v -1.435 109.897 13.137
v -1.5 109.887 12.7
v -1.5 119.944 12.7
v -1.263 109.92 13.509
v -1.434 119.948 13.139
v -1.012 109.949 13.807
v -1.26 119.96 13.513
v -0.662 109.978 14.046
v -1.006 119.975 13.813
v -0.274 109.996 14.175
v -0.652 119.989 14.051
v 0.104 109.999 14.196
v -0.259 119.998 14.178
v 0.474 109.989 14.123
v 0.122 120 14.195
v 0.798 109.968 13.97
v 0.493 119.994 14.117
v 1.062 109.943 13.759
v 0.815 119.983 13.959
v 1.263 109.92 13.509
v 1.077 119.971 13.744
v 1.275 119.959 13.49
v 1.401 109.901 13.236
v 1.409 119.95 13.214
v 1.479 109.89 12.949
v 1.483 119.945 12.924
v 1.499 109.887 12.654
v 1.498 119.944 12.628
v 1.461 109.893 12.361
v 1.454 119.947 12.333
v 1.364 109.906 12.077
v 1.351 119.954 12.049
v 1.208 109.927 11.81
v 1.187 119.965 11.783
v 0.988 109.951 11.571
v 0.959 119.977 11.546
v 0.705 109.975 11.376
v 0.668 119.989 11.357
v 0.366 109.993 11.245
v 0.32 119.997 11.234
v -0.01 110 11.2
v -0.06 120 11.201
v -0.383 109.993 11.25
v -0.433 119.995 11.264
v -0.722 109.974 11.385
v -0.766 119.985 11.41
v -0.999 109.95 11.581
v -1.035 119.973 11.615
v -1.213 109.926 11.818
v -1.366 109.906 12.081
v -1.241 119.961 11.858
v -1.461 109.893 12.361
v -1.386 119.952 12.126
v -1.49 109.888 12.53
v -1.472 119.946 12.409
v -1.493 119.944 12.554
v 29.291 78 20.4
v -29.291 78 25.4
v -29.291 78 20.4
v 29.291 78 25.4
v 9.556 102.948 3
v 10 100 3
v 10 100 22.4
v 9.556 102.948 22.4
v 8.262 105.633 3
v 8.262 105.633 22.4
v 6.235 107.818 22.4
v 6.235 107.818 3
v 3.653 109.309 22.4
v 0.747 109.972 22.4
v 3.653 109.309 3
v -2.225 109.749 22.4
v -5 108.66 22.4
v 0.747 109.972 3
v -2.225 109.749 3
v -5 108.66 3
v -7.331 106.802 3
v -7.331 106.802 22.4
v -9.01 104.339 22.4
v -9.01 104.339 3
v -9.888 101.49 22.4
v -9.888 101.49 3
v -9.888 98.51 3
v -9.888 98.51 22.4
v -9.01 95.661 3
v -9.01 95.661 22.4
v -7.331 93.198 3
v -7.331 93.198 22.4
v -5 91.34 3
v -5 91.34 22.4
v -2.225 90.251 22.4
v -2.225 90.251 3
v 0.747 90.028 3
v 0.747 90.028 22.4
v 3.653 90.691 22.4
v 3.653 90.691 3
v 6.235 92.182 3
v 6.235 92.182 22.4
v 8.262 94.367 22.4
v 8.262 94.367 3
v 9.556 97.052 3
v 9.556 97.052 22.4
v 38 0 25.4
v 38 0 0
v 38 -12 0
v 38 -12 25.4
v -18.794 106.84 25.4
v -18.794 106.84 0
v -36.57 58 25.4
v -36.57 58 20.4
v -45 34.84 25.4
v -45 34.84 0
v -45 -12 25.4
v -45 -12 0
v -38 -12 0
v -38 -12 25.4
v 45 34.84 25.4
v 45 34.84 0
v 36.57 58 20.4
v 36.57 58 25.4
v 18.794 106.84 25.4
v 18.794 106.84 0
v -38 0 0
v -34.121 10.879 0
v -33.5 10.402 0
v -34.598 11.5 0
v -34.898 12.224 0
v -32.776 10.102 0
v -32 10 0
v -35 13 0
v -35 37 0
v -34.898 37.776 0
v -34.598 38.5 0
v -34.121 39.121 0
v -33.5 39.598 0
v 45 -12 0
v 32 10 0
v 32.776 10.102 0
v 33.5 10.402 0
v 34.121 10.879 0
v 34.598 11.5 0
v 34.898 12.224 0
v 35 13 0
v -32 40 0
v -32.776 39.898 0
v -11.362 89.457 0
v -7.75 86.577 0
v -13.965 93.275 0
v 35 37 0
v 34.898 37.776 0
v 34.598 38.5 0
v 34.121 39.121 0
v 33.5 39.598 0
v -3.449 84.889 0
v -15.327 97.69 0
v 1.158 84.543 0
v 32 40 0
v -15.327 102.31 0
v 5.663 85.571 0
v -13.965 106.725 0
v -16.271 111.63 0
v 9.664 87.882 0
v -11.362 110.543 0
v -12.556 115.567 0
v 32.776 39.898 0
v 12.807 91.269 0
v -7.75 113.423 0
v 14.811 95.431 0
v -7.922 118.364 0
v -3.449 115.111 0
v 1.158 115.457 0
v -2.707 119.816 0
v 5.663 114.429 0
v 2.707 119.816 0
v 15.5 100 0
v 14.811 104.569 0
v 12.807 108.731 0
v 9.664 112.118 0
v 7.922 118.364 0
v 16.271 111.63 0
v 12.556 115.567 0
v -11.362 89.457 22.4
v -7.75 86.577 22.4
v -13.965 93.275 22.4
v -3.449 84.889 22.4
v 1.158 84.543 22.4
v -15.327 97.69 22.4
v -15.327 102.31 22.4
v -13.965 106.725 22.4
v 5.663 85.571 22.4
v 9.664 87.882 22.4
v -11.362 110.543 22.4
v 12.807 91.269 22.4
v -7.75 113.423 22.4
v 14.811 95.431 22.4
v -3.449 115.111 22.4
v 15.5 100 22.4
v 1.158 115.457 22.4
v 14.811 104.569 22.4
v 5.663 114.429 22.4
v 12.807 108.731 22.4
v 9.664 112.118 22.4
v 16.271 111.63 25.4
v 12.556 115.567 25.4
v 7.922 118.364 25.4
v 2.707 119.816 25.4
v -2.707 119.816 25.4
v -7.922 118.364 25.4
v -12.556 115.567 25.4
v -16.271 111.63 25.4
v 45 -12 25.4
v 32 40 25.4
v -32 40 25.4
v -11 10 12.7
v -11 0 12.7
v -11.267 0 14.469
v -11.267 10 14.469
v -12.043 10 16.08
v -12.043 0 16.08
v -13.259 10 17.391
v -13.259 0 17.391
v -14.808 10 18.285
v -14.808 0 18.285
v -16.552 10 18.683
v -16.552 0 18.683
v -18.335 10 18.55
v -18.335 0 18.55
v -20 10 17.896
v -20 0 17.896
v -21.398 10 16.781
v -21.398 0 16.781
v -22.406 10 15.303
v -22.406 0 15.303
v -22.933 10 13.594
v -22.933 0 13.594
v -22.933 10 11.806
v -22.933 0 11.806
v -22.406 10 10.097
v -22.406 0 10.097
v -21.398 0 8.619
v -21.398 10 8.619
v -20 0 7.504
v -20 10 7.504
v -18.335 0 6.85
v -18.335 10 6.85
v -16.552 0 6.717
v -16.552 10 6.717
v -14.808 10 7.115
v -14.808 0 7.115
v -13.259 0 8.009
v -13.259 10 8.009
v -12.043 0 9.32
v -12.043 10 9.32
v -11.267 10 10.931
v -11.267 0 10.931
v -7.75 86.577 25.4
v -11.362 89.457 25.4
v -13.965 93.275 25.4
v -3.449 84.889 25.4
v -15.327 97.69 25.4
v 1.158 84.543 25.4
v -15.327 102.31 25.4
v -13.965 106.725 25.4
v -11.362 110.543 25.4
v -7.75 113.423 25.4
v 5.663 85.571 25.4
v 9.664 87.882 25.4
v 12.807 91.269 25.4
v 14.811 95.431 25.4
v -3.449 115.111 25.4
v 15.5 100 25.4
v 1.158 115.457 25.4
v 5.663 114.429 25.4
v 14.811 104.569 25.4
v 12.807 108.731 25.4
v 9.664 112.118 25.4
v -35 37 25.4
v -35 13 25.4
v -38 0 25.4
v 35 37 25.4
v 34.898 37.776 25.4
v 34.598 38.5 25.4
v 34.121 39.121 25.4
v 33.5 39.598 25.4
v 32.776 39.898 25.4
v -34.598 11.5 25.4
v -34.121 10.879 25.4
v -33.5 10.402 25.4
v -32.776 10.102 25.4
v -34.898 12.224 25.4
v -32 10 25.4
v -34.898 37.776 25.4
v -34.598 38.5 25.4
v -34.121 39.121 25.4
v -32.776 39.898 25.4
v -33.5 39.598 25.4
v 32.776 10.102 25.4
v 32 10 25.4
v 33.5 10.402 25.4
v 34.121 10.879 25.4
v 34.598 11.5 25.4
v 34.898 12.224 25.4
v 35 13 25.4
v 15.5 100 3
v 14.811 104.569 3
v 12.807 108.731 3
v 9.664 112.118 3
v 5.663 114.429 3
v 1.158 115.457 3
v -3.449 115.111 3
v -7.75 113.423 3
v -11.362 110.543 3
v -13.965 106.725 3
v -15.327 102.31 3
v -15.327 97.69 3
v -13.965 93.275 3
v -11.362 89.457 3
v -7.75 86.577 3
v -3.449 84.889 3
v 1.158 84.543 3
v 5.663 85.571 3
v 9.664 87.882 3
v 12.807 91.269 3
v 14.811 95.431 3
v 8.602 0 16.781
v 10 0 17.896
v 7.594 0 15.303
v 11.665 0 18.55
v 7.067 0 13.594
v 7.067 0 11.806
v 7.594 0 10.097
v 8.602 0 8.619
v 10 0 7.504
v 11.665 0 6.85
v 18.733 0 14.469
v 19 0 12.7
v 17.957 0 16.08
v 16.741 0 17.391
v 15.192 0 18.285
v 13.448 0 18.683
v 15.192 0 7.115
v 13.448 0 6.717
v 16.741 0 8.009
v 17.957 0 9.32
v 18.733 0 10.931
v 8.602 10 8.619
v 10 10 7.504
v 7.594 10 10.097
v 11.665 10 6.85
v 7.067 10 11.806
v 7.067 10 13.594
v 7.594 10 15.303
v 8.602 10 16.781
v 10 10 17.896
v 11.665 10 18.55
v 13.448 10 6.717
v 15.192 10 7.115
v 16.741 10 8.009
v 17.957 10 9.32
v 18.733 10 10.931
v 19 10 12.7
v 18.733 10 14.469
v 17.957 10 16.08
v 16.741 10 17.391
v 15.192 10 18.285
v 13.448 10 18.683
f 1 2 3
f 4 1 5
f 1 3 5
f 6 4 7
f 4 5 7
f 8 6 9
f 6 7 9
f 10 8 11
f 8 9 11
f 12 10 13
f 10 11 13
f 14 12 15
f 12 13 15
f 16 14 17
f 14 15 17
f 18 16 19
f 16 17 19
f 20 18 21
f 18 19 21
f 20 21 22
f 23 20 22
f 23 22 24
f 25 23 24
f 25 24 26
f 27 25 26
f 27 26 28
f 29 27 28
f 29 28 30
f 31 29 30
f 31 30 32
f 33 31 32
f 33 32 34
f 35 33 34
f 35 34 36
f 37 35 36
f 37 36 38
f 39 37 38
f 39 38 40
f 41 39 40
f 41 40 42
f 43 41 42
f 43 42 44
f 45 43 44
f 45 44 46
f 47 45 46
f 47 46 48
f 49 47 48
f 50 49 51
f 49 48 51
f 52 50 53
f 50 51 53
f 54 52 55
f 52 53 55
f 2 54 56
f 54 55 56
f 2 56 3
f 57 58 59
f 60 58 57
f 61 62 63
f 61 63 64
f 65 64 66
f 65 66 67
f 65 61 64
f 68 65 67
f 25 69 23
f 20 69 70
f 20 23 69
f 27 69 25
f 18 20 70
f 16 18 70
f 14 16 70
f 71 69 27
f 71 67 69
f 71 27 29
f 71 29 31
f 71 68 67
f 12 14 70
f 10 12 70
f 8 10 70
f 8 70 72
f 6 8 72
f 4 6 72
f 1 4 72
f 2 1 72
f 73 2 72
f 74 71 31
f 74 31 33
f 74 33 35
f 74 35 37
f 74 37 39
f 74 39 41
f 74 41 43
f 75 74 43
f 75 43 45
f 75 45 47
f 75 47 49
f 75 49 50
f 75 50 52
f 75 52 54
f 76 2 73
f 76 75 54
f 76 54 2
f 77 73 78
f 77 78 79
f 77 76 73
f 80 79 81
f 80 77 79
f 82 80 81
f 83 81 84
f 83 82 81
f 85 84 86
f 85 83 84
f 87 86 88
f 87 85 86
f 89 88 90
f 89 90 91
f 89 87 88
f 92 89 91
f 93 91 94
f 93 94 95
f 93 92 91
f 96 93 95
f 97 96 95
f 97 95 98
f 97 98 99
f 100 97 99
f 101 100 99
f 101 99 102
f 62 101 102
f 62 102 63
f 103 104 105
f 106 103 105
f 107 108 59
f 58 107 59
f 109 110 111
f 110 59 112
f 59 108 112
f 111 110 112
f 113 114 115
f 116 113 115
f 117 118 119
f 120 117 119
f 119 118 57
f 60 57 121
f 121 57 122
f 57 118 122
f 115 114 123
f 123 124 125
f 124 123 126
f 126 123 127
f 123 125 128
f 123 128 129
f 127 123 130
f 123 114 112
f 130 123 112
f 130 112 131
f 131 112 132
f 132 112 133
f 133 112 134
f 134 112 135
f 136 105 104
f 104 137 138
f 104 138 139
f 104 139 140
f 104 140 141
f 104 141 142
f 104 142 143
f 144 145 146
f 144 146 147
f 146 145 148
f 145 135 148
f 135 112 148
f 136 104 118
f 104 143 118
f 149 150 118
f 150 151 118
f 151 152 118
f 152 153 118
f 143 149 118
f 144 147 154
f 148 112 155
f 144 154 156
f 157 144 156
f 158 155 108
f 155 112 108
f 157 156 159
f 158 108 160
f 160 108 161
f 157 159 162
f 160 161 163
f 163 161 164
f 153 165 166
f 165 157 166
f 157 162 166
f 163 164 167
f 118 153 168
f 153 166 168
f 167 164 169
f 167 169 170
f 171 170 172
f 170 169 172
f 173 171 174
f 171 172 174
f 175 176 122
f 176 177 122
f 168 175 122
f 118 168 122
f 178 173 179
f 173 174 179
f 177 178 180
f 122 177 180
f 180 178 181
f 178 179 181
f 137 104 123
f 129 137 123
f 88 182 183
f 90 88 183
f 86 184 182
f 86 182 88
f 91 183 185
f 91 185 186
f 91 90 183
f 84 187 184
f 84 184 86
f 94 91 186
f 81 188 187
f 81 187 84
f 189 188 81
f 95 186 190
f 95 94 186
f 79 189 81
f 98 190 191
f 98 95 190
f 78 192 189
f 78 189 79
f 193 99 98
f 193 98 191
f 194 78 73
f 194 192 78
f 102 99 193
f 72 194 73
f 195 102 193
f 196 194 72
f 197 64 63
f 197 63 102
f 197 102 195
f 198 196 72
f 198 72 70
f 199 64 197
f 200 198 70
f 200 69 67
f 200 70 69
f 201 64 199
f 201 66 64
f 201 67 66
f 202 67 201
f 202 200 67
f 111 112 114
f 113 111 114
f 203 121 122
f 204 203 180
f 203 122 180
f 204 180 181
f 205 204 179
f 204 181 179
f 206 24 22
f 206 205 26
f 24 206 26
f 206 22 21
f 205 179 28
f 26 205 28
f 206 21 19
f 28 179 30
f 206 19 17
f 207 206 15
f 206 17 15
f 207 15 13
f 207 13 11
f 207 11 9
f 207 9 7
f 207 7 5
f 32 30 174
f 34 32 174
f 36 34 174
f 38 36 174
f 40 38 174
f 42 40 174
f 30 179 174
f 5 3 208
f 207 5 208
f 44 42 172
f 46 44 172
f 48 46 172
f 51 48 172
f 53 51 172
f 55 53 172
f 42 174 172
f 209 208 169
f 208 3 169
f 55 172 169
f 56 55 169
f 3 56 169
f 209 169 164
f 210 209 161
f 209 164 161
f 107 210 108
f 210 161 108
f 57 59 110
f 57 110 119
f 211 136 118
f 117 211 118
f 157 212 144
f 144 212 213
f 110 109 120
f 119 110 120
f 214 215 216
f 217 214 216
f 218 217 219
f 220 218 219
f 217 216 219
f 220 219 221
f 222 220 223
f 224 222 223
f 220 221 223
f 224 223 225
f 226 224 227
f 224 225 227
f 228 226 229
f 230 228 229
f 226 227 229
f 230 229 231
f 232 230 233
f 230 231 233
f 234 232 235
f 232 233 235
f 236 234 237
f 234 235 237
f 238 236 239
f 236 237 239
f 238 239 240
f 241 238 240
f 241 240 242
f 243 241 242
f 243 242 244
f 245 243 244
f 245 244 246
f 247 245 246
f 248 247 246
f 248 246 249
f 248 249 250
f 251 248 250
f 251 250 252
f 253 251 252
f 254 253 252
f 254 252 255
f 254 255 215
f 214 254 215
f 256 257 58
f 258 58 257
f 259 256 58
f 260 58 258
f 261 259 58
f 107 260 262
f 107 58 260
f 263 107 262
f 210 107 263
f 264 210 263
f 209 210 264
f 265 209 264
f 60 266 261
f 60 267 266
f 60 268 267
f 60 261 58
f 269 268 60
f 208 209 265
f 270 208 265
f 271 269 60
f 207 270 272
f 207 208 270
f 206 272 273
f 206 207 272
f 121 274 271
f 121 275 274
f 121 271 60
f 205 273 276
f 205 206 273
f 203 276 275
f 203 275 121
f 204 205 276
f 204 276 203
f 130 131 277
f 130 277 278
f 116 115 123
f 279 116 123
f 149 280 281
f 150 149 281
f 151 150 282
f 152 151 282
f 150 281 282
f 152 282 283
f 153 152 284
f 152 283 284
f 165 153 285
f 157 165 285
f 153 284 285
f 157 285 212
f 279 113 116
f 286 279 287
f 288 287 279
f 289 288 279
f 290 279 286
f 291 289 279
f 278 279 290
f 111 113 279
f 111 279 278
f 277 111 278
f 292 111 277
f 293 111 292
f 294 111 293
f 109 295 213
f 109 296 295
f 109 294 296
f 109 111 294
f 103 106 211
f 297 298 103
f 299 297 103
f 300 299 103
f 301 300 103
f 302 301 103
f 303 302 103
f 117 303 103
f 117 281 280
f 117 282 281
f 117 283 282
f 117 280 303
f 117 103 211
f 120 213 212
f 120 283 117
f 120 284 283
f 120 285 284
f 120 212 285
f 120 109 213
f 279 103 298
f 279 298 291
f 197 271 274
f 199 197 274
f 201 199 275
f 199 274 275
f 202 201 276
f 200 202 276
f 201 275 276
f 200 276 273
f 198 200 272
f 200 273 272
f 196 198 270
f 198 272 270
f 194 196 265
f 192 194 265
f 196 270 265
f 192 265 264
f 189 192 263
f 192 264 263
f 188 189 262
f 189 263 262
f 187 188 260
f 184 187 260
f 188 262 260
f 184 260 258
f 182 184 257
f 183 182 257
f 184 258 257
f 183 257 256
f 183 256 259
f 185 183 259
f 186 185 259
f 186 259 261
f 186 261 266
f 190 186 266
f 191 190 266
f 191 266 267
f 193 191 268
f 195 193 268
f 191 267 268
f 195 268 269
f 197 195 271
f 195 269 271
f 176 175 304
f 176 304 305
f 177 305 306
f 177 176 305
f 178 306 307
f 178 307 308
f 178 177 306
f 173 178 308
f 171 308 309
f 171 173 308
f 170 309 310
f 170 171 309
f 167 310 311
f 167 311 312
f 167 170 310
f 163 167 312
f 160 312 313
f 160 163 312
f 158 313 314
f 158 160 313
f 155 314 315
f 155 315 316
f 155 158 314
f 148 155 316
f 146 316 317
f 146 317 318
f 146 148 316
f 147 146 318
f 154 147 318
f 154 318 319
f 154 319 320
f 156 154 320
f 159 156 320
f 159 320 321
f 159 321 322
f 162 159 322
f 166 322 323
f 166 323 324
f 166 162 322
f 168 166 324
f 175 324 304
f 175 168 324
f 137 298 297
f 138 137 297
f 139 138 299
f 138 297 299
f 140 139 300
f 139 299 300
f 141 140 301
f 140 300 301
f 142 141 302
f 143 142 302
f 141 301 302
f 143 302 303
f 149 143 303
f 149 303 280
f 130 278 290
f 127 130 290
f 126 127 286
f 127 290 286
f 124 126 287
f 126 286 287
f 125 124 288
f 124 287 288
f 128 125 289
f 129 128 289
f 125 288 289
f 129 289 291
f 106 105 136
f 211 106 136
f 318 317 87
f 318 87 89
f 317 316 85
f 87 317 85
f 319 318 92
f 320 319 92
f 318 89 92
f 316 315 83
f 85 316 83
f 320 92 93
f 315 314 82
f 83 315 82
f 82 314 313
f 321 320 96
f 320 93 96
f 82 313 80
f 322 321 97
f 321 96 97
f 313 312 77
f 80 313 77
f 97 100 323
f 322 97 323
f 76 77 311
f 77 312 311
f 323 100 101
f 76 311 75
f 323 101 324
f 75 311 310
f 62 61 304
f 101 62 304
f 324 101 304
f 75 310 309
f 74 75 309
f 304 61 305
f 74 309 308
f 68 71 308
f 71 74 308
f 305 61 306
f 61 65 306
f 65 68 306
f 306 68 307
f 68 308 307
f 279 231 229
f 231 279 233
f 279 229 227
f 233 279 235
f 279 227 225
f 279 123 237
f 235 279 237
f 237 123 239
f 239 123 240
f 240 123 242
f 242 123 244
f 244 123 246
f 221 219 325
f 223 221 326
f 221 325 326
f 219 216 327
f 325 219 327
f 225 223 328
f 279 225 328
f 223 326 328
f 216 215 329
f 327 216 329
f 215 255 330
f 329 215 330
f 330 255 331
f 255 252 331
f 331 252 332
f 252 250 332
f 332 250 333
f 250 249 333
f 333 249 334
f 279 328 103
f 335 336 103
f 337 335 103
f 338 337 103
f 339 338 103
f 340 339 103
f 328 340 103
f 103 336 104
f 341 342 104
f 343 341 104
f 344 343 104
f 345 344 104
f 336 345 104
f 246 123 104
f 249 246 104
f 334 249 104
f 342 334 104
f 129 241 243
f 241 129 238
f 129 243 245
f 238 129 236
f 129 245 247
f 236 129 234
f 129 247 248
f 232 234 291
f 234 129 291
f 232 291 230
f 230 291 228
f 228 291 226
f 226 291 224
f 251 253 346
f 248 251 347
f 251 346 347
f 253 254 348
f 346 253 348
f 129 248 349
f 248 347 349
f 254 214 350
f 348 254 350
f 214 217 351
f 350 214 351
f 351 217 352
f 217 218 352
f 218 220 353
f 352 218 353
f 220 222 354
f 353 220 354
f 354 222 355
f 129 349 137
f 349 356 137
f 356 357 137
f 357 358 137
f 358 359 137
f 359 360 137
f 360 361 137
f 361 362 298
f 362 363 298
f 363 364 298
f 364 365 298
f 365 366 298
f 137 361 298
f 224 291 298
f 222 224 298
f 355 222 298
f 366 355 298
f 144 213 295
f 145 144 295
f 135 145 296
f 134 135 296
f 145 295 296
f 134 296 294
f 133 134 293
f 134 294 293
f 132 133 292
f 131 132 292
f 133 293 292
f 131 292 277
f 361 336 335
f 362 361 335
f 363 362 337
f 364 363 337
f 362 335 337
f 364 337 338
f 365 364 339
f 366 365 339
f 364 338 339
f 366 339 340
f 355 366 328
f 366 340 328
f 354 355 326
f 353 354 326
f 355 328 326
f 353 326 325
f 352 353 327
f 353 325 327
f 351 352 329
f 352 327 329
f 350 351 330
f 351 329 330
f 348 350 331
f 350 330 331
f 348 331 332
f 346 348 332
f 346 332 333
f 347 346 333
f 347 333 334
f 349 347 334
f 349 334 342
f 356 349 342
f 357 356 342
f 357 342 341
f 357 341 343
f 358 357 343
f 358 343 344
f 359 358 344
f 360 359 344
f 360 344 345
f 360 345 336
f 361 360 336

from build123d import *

# Parameters (mm, degrees)
SKETCH1_R          = 10
EXTRUDE1_DEPTH     = 25.4
CUT_EXTRUDE1_DEPTH = 26.4
CUT_EXTRUDE2_REACH = 122
SKETCH5_R          = 6
CUT_EXTRUDE3_REACH = 151
SKETCH6_R          = 1.5
SKETCH7_W          = 131.09029237
SKETCH7_H          = 20
EXTRUDE2_DEPTH     = 5
SKETCH8_R          = 15.5
SKETCH8_R_2        = 10
EXTRUDE3_DEPTH     = 3


with BuildPart() as part:
    # Sketch1 → Extrude1 (new body)
    with BuildSketch(Plane.XY):
        with BuildLine():
            Line((-38, 0), (38, 0))
            Line((38, 0), (38, -12))
            Line((38, -12), (45, -12))
            Line((45, -12), (45, 34.839604128))
            Line((45, 34.839604128), (18.793852416, 106.840402867))
            ThreePointArc((18.793852416, 106.840402867), (0, 120), (-18.793852416, 106.840402867))
            Line((-18.793852416, 106.840402867), (-45, 34.839604128))
            Line((-45, 34.839604128), (-45, -12))
            Line((-45, -12), (-38, -12))
            Line((-38, -12), (-38, 0))
        make_face()
        with Locations((0, 100)):
            Circle(SKETCH1_R, mode=Mode.SUBTRACT)
    extrude(amount=EXTRUDE1_DEPTH)

    # Sketch2 → Cut-Extrude1 (cut, through all)
    with BuildSketch(Plane.XY.offset(25.4)):
        with BuildLine():
            Line((-32, 10), (32, 10))
            ThreePointArc((32, 10), (34.121320344, 10.878679656), (35, 13))
            Line((35, 13), (35, 37))
            ThreePointArc((35, 37), (34.121320344, 39.121320344), (32, 40))
            Line((32, 40), (-32, 40))
            ThreePointArc((-32, 40), (-34.121320344, 39.121320344), (-35, 37))
            Line((-35, 37), (-35, 13))
            ThreePointArc((-35, 13), (-34.121320344, 10.878679656), (-32, 10))
        make_face()
    extrude(amount=-CUT_EXTRUDE1_DEPTH, mode=Mode.SUBTRACT)

    # Sketch5 → Cut-Extrude2 (cut, up to next)
    with BuildSketch(Plane.XZ, mode=Mode.PRIVATE) as cut_extrude2_sk1:
        with Locations((13, 12.7)):
            Circle(SKETCH5_R)
    cut_extrude2_tool1 = extrude(cut_extrude2_sk1.sketch, amount=-CUT_EXTRUDE2_REACH, mode=Mode.PRIVATE) & part.part
    add(cut_extrude2_tool1.solids().sort_by_distance((13, 0, 12.7))[0], mode=Mode.SUBTRACT)
    # Sketch5 → Cut-Extrude2 (cut, up to next)
    with BuildSketch(Plane.XZ, mode=Mode.PRIVATE) as cut_extrude2_sk2:
        with Locations((-17, 12.7)):
            Circle(SKETCH5_R)
    cut_extrude2_tool2 = extrude(cut_extrude2_sk2.sketch, amount=-CUT_EXTRUDE2_REACH, mode=Mode.PRIVATE) & part.part
    add(cut_extrude2_tool2.solids().sort_by_distance((-17, 0, 12.7))[0], mode=Mode.SUBTRACT)

    # Sketch6 → Cut-Extrude3 (cut, up to next)
    with BuildSketch(Plane(origin=(0, 137, 0), x_dir=(-1, 0, 0), z_dir=(0, 1, 0)), mode=Mode.PRIVATE) as cut_extrude3_sk1:
        with Locations((0, 12.7)):
            Circle(SKETCH6_R)
    cut_extrude3_tool1 = extrude(cut_extrude3_sk1.sketch, amount=-CUT_EXTRUDE3_REACH, mode=Mode.PRIVATE) & part.part
    add(cut_extrude3_tool1.solids().sort_by_distance((0, 137, 12.7))[0], mode=Mode.SUBTRACT)

    # Sketch7 → Extrude2 (cut)
    with BuildSketch(Plane.XY.offset(25.4)):
        with Locations((2.300736004, 68)):
            Rectangle(SKETCH7_W, SKETCH7_H)
    extrude(amount=-EXTRUDE2_DEPTH, mode=Mode.SUBTRACT)

    # Sketch8 → Extrude3 (cut)
    with BuildSketch(Plane.XY.offset(25.4)):
        with Locations((0, 100)):
            Circle(SKETCH8_R)
        with Locations((0, 100)):
            Circle(SKETCH8_R_2, mode=Mode.SUBTRACT)
    extrude3 = extrude(amount=-EXTRUDE3_DEPTH, mode=Mode.SUBTRACT)

    # Mirror1: Extrude3 across plane
    add(extrude3.mirror(Plane.XY.offset(12.7)), mode=Mode.SUBTRACT)


solid = part.part
